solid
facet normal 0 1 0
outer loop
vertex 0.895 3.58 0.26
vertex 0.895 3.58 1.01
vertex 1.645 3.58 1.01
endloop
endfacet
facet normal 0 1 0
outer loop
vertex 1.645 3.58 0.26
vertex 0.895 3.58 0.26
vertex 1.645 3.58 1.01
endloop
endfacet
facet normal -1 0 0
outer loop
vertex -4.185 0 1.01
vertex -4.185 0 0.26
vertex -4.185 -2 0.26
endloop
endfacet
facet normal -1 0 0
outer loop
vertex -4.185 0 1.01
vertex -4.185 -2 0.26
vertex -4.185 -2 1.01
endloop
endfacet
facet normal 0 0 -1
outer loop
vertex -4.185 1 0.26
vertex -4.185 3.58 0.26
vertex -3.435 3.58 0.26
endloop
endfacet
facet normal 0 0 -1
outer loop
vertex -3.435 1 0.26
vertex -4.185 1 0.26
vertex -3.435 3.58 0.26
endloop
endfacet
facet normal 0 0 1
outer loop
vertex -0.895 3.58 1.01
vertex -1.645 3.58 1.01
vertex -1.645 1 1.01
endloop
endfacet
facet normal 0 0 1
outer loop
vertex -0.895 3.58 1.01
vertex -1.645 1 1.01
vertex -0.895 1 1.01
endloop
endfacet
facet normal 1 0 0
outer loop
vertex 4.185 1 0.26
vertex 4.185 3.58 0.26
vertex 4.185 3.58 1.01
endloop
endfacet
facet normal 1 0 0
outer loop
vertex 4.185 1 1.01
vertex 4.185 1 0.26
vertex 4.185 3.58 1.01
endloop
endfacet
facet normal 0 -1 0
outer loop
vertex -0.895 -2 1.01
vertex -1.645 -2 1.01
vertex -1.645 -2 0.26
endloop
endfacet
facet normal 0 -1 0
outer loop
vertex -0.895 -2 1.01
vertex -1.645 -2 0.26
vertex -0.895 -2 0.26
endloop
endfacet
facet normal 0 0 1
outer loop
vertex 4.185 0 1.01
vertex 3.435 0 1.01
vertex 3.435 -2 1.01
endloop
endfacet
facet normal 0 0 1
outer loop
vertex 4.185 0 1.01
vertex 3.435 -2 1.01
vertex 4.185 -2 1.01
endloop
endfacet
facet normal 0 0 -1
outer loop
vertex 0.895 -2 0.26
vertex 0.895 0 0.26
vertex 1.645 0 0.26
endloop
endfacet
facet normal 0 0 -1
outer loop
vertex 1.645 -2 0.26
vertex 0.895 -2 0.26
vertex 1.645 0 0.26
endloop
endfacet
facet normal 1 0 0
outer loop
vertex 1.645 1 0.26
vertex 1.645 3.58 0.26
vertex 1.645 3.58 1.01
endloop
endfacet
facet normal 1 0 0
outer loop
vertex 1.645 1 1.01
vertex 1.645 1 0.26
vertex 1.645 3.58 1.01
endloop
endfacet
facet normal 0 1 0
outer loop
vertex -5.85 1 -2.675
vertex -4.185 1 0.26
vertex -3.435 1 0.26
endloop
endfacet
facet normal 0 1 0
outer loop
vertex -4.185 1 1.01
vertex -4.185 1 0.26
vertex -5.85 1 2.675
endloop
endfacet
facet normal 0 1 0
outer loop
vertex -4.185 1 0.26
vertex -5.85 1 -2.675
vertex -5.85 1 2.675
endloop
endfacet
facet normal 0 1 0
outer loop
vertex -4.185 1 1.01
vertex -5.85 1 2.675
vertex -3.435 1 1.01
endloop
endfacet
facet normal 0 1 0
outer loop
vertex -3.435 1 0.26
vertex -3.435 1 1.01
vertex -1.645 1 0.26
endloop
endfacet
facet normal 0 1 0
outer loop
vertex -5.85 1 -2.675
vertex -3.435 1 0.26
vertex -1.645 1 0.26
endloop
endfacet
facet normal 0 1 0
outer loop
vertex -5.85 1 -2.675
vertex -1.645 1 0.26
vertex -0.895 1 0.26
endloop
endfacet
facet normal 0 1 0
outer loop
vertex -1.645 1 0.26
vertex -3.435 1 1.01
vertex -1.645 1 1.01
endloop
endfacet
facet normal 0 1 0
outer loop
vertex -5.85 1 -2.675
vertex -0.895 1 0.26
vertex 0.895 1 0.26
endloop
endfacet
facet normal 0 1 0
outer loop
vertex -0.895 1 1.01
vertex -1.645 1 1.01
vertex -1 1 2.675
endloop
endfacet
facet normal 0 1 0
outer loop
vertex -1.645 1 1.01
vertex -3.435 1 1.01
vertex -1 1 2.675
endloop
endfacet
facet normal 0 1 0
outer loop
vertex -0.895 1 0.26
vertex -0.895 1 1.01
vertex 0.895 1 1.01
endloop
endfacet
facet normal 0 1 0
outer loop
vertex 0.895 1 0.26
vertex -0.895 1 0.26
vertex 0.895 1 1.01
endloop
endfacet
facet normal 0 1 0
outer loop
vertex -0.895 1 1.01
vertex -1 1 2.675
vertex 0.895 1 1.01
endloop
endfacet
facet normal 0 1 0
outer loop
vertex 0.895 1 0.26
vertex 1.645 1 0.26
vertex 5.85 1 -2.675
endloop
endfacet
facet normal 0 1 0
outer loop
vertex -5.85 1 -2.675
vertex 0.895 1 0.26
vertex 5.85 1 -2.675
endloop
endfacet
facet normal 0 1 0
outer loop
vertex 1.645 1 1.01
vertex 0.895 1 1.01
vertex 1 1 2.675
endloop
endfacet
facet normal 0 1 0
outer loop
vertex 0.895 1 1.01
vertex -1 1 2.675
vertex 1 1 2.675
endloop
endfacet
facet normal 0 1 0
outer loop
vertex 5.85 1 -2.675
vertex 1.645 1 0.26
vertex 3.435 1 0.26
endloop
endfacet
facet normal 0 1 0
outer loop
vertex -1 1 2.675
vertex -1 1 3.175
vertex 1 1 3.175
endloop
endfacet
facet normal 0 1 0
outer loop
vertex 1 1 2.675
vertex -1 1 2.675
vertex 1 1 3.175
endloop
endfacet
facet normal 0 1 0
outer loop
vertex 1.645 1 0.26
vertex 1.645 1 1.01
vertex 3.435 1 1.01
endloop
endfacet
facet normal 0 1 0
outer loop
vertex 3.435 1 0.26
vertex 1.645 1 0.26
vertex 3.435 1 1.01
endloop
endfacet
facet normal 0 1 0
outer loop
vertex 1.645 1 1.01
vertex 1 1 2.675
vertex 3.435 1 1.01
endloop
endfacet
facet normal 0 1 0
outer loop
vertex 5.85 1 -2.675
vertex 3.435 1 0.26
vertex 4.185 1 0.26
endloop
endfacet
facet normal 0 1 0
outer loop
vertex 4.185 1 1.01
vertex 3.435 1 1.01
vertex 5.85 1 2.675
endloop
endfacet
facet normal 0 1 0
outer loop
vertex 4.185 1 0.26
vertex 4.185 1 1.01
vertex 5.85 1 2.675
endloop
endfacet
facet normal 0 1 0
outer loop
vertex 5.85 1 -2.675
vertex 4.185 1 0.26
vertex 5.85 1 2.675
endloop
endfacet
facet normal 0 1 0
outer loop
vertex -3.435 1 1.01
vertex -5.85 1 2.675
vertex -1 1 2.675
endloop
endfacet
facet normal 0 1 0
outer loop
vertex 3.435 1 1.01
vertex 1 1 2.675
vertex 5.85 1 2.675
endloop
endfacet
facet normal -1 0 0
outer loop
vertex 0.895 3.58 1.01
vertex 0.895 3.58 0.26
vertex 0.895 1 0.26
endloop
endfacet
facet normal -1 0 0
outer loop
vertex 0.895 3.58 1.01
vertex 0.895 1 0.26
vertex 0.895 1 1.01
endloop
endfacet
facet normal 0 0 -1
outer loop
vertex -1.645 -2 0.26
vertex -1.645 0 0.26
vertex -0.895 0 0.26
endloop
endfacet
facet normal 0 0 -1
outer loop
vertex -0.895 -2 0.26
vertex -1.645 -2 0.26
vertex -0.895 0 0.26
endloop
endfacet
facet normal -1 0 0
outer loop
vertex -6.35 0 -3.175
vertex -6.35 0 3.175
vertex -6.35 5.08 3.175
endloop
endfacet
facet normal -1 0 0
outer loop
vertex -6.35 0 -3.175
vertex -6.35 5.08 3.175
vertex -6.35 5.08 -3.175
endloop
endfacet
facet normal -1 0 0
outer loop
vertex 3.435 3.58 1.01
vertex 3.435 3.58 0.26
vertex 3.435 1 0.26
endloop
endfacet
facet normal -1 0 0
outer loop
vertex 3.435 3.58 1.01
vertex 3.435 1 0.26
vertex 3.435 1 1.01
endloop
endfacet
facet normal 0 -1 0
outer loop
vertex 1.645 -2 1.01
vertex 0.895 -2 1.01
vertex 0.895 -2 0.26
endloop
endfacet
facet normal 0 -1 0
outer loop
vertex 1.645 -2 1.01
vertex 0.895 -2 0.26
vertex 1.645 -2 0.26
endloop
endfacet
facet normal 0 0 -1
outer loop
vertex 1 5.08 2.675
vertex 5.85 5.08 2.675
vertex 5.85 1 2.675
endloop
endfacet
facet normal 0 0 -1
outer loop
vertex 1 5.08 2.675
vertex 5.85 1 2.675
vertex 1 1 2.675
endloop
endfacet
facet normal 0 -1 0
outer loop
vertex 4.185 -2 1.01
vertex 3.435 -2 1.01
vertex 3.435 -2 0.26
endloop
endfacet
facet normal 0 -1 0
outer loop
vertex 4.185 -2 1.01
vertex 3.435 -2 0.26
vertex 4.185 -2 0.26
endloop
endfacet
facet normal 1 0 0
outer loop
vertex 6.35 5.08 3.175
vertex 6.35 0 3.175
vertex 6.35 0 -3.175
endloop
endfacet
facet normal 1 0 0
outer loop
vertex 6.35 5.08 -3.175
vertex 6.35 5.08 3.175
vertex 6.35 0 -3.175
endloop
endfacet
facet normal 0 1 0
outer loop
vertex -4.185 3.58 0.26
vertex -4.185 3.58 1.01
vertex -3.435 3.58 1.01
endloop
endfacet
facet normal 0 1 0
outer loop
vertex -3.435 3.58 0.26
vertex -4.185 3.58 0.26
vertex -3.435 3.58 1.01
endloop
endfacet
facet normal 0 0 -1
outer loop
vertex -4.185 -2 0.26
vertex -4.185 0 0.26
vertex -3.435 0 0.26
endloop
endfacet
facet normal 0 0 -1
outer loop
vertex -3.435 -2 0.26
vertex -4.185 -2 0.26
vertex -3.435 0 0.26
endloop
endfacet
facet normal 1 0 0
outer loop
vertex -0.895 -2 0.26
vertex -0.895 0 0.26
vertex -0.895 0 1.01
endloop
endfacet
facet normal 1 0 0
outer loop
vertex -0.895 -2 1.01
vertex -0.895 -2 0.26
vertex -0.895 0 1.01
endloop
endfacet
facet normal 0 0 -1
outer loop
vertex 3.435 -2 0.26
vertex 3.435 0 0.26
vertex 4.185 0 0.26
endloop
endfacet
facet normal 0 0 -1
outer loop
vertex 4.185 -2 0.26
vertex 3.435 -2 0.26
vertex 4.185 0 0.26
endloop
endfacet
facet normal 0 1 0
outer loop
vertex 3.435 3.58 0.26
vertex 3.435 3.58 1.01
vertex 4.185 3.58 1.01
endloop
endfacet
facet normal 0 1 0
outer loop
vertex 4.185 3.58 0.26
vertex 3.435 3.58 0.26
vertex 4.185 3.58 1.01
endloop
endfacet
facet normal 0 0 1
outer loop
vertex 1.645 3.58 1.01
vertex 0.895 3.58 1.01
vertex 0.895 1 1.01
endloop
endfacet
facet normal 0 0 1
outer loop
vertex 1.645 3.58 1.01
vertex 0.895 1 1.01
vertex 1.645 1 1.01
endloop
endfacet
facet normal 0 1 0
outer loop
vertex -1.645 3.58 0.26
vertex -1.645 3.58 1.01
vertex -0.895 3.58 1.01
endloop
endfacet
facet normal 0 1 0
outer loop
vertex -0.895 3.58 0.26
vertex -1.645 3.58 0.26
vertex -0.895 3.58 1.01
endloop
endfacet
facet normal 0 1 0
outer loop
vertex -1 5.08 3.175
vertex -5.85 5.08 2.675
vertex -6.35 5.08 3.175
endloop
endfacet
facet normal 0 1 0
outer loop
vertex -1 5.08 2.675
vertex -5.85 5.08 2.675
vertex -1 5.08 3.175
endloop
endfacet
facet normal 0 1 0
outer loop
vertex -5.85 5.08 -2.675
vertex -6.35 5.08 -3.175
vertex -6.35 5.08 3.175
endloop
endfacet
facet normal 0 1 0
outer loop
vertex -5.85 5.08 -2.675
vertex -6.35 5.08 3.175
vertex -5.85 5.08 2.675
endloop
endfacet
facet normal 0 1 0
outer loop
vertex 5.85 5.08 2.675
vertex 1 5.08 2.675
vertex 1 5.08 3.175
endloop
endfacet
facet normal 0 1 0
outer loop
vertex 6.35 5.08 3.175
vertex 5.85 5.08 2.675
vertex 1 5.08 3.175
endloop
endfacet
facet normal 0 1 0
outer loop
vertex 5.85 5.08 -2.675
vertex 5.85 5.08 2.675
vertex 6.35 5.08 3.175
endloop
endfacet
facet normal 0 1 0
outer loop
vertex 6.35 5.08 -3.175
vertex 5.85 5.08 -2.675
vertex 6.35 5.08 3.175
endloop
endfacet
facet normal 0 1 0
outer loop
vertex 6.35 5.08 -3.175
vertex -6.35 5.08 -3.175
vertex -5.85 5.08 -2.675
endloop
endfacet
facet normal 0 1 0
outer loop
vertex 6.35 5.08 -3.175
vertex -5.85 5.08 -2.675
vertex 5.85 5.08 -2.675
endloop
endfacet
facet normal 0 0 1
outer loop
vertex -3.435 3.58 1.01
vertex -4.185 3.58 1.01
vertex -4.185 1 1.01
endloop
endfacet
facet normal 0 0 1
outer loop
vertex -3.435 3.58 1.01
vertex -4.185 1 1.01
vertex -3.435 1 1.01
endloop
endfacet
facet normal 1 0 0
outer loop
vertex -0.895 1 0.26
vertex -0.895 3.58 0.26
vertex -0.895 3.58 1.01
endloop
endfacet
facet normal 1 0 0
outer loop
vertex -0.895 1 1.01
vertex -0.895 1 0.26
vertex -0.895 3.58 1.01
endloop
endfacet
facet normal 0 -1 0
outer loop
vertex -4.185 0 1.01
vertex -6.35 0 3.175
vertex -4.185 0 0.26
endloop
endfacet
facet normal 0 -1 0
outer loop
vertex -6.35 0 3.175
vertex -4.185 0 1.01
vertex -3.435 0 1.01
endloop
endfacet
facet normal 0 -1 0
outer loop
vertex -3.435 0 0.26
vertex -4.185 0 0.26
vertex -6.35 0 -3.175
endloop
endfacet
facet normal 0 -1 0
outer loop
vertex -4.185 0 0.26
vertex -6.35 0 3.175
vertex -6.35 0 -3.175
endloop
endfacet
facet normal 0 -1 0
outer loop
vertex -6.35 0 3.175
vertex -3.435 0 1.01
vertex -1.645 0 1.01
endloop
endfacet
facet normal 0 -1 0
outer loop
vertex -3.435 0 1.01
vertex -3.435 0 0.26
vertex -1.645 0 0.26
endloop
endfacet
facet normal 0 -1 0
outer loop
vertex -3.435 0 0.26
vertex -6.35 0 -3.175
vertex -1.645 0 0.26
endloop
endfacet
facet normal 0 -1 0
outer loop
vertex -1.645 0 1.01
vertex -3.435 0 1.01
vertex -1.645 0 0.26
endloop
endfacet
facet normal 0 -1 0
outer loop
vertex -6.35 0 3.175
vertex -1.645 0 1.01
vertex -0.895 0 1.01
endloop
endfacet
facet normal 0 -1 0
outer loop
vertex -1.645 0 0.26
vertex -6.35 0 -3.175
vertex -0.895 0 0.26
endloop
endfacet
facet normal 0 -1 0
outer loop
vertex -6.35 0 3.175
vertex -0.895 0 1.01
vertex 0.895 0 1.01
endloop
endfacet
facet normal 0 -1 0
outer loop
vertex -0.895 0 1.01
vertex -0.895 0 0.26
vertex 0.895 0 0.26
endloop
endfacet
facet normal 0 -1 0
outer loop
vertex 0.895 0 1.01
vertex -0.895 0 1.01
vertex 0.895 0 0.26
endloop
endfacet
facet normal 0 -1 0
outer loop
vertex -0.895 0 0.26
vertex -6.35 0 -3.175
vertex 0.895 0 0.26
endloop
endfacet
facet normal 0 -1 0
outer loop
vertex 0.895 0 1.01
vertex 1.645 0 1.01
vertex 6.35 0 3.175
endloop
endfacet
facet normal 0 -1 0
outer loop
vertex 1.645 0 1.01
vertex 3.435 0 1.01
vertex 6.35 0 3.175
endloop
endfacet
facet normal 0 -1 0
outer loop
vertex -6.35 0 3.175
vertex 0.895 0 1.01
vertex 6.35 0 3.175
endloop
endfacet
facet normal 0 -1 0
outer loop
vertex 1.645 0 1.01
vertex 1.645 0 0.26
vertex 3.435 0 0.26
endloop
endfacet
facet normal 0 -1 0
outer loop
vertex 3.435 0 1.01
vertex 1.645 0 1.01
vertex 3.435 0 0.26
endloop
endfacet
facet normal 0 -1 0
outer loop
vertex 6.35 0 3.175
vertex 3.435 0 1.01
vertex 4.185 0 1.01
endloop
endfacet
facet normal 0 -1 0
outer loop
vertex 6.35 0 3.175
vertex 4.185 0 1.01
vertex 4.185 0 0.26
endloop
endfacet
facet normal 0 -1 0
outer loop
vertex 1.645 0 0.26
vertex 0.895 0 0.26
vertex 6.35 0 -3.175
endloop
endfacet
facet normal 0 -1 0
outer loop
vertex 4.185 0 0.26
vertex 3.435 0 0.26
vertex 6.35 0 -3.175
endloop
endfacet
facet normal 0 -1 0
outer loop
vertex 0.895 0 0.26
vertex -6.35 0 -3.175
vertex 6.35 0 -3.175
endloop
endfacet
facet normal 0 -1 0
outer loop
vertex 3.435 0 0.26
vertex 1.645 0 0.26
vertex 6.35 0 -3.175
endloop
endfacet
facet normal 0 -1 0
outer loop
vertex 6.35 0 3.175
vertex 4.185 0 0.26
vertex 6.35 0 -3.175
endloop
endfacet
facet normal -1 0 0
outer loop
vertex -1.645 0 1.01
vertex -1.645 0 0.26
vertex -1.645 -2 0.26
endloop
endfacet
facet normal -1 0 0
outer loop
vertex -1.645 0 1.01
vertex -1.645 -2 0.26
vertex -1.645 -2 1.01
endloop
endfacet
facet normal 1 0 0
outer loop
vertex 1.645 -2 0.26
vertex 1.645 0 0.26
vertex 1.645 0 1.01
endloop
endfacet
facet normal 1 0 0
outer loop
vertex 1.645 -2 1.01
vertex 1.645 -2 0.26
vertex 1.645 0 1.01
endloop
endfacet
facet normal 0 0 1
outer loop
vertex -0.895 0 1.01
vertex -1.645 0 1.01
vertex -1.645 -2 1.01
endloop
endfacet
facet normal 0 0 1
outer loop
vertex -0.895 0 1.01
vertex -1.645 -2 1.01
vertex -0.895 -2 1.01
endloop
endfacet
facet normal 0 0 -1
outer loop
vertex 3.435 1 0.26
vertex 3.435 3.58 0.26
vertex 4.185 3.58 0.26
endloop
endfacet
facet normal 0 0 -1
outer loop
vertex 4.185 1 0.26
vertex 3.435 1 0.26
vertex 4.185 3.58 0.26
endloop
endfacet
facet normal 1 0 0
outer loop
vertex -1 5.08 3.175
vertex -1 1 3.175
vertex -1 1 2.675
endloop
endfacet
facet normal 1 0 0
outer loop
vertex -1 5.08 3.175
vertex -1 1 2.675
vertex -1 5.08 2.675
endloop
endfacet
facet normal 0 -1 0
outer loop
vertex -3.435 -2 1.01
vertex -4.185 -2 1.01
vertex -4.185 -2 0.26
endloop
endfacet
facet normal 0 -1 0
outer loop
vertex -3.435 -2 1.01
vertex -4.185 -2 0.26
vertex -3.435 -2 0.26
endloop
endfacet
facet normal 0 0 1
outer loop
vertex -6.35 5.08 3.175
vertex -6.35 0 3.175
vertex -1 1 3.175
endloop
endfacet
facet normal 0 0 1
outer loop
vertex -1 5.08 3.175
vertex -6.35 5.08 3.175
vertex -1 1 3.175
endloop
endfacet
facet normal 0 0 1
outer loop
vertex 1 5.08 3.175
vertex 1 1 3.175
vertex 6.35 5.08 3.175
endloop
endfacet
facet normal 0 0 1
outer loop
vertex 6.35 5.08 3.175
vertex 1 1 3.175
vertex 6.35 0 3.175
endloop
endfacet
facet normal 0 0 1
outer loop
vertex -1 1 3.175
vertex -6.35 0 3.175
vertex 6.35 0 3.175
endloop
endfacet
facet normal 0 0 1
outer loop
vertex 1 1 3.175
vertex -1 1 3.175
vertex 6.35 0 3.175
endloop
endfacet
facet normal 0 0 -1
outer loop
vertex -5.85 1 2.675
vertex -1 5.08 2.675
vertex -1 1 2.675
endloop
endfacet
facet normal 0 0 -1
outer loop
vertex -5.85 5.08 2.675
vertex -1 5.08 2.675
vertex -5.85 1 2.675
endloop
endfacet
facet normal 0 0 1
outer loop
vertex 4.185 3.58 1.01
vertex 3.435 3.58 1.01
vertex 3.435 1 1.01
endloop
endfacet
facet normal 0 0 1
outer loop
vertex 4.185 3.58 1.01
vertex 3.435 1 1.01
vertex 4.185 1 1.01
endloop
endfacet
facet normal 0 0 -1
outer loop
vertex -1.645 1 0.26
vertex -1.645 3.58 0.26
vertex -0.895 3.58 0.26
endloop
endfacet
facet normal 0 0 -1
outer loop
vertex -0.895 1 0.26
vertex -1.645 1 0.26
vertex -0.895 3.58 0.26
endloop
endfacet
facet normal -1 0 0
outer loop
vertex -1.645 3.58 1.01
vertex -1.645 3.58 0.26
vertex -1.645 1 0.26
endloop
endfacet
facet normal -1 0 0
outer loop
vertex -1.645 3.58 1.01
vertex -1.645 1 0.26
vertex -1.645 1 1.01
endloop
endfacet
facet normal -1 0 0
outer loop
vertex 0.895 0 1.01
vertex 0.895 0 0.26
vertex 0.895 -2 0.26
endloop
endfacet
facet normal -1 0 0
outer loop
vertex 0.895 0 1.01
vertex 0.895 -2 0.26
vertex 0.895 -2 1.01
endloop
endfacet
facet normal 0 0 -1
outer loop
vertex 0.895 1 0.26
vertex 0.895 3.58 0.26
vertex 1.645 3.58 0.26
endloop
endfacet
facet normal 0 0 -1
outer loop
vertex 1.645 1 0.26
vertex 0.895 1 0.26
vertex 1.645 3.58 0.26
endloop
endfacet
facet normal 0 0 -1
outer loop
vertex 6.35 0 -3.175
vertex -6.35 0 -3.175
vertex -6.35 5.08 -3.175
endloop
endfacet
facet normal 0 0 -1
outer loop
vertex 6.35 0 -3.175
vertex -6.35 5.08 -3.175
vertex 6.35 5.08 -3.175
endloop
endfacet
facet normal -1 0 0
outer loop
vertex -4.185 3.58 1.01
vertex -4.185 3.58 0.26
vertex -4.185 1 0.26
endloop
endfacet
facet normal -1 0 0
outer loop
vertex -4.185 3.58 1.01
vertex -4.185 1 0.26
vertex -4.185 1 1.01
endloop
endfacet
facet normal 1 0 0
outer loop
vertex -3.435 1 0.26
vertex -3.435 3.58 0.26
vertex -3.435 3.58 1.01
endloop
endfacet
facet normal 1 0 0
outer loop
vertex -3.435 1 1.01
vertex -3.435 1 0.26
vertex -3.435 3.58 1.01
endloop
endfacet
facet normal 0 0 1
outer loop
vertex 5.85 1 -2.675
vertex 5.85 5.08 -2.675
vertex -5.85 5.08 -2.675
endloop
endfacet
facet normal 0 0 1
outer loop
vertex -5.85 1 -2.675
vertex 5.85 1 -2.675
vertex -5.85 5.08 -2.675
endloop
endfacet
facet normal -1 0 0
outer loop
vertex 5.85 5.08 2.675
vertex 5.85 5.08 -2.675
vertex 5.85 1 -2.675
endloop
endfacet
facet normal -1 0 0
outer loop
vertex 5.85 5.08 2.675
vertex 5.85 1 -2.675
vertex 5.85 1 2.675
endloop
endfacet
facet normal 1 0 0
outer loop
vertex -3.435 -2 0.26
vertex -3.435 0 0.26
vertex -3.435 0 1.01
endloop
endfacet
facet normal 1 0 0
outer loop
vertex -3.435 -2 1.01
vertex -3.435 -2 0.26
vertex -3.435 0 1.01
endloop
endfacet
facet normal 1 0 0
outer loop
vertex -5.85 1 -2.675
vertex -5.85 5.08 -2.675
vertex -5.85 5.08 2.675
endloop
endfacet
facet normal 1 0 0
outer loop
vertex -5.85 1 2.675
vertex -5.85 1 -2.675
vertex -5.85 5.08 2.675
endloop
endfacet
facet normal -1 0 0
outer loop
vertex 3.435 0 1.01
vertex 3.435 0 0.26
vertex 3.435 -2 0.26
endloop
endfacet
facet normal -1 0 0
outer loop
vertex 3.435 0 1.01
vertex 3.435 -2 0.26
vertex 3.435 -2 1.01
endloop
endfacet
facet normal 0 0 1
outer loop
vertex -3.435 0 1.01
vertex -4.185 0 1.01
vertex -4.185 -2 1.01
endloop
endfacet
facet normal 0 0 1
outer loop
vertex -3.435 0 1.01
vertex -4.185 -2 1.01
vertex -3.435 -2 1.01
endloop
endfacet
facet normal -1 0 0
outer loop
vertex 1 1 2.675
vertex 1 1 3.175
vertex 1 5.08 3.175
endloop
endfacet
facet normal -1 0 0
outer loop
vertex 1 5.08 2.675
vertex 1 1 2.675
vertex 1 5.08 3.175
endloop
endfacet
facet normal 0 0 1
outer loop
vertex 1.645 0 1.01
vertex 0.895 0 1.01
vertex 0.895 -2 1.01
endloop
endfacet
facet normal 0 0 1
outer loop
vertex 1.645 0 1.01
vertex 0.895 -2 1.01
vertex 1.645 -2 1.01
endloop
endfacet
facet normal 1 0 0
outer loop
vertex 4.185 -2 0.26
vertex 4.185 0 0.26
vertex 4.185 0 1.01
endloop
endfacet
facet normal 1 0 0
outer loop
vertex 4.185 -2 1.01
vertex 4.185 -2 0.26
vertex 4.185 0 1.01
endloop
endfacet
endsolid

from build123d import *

# Parameters (mm, degrees)
SKETCH_1_W           = 12.7
SKETCH_1_H           = 6.35
EXTRUDE_1_DEPTH      = 5.08
SKETCH_2_W           = 11.7
SKETCH_2_H           = 5.35
CUT_EXTRUDE_1_DEPTH  = 4.08
SKETCH_3_W           = 2
SKETCH_3_H           = 4.08
CUT_EXTRUDE_2_DEPTH  = 1
EXTRUDE_2_DEPTH      = 2
EXTRUDE_2_DEPTH_BACK = 3.58
SKETCH_4_W           = 0.75
SKETCH_4_H           = 0.75


with BuildPart() as part:
    # 草图1 → 拉伸1 (new body)
    with BuildSketch(Plane(origin=(0, 0, 0), x_dir=(1, 0, 0), z_dir=(0, 1, 0))):
        Rectangle(SKETCH_1_W, SKETCH_1_H)
    extrude(amount=EXTRUDE_1_DEPTH)

    # 草图2 → 切除-拉伸1 (cut)
    with BuildSketch(Plane(origin=(0, 5.08, 0), x_dir=(-1, 0, 0), z_dir=(0, 1, 0))):
        Rectangle(SKETCH_2_W, SKETCH_2_H)
    extrude(amount=-CUT_EXTRUDE_1_DEPTH, mode=Mode.SUBTRACT)

    # 草图3 → 切除-拉伸2 (cut)
    with BuildSketch(Plane.XY.offset(3.175)):
        with Locations((0, 3.04)):
            Rectangle(SKETCH_3_W, SKETCH_3_H)
    extrude(amount=-CUT_EXTRUDE_2_DEPTH, mode=Mode.SUBTRACT)

    # 草图4 → 拉伸2 (add, two sides: drawn at the far end of the back side and taken through both)
    with BuildSketch(Plane.XZ.offset(-EXTRUDE_2_DEPTH_BACK)):
        with Locations((-1.27, 0.635)):
            Rectangle(SKETCH_4_W, SKETCH_4_H)
        with Locations((1.27, 0.635)):
            Rectangle(SKETCH_4_W, SKETCH_4_H)
        with Locations((3.81, 0.635)):
            Rectangle(SKETCH_4_W, SKETCH_4_H)
        with Locations((-3.81, 0.635)):
            Rectangle(SKETCH_4_W, SKETCH_4_H)
    extrude(amount=EXTRUDE_2_DEPTH + EXTRUDE_2_DEPTH_BACK)


solid = part.part
